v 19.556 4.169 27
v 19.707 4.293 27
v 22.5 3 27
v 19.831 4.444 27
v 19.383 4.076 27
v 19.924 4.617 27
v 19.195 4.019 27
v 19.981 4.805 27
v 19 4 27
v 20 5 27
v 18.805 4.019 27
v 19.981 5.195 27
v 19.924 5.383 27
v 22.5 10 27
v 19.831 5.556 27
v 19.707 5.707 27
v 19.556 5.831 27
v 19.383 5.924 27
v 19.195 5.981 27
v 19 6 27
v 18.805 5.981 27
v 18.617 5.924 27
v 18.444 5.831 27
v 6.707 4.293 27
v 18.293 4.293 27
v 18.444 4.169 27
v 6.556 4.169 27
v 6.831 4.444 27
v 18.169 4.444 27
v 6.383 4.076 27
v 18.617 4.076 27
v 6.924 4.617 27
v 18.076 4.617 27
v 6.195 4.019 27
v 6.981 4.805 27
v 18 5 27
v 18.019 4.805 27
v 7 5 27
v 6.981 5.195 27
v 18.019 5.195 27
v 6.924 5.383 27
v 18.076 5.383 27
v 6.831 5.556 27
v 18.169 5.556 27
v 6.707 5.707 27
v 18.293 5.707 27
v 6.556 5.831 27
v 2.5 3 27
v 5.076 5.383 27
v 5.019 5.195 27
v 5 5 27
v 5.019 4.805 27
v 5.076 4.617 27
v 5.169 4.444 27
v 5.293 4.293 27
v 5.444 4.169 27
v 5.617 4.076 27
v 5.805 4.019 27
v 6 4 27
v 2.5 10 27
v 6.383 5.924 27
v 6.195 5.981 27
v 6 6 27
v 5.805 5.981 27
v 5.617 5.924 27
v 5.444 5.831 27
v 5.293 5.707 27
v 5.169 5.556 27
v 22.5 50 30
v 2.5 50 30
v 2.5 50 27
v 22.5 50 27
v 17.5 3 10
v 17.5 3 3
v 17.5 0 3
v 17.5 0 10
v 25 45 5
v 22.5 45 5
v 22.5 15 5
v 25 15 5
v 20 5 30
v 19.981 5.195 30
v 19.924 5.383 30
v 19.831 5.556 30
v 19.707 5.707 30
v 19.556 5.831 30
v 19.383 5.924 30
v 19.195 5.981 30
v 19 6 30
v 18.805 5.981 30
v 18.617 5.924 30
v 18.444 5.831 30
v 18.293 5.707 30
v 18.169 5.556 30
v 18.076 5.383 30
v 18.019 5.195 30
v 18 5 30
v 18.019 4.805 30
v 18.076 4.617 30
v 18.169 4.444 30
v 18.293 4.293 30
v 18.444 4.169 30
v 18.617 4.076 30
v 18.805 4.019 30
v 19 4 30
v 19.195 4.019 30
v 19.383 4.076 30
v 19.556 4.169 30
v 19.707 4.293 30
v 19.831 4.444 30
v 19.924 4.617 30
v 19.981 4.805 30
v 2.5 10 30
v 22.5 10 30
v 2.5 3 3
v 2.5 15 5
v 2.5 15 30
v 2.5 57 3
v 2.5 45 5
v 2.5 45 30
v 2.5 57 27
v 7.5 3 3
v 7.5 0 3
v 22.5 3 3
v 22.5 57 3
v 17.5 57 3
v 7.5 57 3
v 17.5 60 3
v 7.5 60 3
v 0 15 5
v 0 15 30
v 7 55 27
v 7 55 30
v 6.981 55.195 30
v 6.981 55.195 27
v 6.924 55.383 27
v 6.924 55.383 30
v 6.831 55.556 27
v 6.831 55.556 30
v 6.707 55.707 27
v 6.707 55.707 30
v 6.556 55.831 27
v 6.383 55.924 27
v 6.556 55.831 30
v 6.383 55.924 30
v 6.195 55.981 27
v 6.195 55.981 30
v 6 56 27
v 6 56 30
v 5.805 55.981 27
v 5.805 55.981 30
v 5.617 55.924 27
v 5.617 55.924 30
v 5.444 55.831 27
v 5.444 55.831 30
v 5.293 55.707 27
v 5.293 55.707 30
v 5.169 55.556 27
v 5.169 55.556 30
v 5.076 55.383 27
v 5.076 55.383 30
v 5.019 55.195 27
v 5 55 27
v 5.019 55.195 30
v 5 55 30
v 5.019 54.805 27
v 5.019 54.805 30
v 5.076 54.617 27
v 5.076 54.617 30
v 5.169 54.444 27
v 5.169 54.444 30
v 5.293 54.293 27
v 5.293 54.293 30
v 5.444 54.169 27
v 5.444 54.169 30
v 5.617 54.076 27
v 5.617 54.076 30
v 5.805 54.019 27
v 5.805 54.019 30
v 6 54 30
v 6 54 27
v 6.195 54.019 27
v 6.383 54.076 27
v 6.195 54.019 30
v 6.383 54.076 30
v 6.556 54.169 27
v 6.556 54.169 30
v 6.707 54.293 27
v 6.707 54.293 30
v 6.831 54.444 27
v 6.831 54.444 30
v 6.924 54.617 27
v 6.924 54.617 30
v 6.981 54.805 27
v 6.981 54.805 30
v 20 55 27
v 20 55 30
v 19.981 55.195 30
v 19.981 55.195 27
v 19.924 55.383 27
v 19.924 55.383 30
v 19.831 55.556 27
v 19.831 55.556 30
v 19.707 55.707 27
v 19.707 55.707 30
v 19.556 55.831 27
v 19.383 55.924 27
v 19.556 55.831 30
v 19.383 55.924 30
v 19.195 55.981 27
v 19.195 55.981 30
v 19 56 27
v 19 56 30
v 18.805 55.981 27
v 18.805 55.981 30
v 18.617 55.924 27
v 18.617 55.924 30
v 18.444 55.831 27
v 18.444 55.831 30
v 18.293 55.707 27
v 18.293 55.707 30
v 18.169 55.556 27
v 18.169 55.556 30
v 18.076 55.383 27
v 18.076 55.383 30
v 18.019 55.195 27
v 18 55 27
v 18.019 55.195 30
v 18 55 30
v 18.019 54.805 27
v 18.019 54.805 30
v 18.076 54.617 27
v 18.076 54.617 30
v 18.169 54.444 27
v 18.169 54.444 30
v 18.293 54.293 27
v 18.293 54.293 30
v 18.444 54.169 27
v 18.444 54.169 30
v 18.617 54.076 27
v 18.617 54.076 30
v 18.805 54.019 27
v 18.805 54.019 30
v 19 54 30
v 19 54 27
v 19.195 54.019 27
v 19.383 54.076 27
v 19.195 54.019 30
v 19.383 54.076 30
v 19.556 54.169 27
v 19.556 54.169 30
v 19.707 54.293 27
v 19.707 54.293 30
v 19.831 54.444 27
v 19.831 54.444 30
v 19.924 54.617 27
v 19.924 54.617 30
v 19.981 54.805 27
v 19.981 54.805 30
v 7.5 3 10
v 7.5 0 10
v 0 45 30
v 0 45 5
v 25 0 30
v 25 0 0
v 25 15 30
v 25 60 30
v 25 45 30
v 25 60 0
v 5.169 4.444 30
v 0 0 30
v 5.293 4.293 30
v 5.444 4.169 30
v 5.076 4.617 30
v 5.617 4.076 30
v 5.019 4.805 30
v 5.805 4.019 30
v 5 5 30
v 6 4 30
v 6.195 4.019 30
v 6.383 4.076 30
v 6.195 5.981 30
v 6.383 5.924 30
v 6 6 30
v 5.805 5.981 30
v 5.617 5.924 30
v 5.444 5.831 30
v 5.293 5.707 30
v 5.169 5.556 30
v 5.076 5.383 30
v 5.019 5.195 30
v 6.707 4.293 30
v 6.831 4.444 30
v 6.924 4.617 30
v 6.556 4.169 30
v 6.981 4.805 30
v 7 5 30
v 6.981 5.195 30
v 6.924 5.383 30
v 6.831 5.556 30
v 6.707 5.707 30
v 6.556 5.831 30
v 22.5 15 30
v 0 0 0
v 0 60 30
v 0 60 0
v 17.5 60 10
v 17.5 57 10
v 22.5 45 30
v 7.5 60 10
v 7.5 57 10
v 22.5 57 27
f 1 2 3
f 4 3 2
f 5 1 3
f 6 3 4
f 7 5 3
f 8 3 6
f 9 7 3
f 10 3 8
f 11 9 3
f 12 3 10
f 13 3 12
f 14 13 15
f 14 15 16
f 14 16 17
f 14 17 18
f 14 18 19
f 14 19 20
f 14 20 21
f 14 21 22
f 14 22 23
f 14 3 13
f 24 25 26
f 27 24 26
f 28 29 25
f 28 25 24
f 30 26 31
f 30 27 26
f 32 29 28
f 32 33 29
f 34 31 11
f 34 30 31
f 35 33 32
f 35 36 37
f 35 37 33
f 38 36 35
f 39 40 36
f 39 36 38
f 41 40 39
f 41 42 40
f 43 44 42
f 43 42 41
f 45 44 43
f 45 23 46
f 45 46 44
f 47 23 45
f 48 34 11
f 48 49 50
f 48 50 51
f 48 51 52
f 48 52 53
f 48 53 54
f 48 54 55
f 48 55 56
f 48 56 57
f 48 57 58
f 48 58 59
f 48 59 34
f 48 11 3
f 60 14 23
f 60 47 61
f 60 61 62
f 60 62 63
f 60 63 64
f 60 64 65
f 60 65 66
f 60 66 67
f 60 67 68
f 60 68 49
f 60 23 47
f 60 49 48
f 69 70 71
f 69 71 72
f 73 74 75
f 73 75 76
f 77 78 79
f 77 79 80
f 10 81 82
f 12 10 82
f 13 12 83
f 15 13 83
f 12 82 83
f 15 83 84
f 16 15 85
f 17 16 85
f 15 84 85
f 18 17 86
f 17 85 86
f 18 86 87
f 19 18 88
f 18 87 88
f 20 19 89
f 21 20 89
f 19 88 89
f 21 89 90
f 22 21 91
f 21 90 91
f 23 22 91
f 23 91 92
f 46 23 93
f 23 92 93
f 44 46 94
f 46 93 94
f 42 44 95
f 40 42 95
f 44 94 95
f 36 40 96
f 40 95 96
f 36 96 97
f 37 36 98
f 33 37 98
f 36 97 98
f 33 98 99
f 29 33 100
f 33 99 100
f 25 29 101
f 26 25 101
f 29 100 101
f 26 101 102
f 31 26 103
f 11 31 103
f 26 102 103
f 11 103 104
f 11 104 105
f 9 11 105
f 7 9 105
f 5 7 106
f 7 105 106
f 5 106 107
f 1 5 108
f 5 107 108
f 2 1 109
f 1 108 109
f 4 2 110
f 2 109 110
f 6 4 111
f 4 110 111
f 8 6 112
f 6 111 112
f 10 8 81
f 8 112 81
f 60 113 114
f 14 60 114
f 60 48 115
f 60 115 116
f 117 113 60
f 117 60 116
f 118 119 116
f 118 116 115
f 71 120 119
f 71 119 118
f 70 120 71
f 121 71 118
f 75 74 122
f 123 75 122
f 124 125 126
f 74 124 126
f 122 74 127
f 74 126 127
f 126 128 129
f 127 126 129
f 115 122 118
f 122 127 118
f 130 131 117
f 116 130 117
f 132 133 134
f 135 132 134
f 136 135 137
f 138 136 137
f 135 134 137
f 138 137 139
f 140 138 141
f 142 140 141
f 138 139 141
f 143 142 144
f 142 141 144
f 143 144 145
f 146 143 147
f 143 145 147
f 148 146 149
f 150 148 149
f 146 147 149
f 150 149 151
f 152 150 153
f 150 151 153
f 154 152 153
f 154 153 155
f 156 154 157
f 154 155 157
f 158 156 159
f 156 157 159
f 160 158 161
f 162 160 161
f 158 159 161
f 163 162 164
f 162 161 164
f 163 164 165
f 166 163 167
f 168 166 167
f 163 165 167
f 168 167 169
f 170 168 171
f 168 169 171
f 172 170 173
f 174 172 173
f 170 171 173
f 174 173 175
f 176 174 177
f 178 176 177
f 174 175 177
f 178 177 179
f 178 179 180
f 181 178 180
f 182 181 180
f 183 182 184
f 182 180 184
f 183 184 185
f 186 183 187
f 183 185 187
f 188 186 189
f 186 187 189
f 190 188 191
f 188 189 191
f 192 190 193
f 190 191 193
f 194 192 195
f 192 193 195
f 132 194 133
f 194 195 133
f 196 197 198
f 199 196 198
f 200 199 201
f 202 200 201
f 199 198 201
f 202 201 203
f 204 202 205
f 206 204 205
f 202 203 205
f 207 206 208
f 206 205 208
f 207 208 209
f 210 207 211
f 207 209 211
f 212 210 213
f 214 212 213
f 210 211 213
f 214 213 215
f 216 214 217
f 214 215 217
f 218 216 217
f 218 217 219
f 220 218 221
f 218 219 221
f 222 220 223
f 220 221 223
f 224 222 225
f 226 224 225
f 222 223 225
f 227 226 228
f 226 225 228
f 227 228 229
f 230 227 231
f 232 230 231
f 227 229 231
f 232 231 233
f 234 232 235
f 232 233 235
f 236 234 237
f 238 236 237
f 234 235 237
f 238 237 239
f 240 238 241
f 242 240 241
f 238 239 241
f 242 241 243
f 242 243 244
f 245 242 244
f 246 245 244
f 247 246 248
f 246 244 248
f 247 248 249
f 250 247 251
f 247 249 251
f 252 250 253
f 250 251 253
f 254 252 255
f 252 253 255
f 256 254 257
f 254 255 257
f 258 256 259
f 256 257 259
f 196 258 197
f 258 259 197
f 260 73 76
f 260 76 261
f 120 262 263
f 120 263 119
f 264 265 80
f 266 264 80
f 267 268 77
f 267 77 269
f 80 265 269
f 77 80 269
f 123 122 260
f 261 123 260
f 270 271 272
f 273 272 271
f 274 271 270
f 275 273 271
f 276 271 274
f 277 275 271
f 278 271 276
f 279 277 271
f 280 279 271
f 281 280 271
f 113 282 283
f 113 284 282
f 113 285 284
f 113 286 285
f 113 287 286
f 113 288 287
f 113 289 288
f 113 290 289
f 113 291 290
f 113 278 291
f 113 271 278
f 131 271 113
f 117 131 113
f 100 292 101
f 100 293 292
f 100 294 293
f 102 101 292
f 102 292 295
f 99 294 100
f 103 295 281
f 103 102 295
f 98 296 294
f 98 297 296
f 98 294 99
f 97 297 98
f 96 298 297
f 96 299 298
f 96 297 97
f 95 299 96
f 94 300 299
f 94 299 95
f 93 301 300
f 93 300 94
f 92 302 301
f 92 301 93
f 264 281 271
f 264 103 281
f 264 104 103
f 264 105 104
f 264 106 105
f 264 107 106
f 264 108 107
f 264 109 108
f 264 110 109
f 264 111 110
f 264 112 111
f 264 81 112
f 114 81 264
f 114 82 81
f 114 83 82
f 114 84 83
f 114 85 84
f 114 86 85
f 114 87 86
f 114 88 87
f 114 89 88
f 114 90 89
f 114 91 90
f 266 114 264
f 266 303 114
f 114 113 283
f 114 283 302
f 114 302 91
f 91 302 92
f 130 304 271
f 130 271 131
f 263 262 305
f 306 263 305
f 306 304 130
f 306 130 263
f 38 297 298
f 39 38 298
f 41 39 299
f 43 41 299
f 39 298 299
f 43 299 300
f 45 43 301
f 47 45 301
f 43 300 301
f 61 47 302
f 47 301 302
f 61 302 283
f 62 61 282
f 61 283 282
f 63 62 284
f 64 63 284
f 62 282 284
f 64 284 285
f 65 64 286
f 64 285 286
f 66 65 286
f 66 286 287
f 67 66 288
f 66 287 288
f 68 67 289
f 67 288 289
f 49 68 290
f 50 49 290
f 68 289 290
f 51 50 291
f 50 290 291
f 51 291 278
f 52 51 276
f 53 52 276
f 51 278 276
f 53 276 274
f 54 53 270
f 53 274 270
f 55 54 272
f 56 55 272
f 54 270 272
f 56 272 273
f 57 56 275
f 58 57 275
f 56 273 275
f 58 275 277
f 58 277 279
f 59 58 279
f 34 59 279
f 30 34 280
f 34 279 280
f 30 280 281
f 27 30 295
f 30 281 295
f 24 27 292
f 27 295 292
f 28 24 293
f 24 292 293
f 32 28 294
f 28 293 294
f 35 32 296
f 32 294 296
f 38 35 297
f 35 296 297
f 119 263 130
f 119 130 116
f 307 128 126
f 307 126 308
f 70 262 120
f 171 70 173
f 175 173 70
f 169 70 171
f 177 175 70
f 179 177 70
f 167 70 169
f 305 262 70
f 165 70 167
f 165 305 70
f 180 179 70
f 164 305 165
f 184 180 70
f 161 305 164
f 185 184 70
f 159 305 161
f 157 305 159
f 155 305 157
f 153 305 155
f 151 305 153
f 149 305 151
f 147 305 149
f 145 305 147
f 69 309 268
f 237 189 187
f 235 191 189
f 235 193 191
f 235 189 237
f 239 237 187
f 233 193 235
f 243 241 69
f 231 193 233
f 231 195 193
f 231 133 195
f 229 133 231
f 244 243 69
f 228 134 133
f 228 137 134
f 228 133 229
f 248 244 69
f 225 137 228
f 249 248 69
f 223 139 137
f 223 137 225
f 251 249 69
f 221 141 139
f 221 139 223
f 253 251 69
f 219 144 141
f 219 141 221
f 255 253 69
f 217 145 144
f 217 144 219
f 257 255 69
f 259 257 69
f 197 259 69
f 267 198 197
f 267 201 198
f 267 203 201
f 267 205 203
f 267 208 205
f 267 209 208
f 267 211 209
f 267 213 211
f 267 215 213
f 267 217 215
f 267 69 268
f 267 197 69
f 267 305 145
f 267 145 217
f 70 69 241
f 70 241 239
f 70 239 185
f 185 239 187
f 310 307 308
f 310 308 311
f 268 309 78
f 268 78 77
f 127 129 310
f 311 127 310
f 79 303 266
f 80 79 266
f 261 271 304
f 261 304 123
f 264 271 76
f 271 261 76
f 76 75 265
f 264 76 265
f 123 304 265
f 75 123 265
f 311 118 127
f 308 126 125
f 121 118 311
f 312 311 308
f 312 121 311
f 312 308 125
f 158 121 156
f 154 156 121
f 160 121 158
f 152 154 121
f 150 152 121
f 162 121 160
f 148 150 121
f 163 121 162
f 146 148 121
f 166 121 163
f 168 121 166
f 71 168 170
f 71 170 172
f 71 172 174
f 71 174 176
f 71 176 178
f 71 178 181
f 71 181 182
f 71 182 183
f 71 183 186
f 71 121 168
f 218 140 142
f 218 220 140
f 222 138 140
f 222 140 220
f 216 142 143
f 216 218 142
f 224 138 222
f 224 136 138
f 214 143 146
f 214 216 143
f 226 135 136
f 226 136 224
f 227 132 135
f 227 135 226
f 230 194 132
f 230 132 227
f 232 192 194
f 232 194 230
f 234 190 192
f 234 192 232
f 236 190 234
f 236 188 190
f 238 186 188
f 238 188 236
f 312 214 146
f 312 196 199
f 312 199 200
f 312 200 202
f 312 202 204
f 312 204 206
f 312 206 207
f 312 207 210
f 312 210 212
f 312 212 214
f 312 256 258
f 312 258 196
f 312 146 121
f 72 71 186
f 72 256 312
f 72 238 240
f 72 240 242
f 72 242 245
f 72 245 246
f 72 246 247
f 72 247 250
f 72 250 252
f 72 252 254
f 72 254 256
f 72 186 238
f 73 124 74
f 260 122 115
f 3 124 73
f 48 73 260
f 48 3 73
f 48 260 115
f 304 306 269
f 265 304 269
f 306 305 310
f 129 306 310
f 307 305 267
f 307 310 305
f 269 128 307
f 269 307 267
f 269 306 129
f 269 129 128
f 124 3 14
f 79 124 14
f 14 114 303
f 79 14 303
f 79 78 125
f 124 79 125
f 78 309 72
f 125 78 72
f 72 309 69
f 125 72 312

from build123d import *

# Parameters (mm, degrees)
SKETCH_W        = 25
SKETCH_H        = 60
PAD_DEPTH       = 30
SKETCH001_W     = 20
SKETCH001_H     = 40
POCKET_DEPTH    = 27
SKETCH002_W     = 2.5
SKETCH002_H     = 30
POCKET001_DEPTH = 25
SKETCH003_W     = 2.5
SKETCH003_H     = 30
POCKET002_DEPTH = 25
SKETCH004_W     = 20
SKETCH004_H     = 24
POCKET003_DEPTH = 7
SKETCH005_W     = 20
SKETCH005_H     = 24
POCKET004_DEPTH = 7
SKETCH006_W     = 10
SKETCH006_H     = 7
POCKET005_DEPTH = 60.001
SKETCH007_R     = 1
POCKET006_DEPTH = 3
SKETCH008_R     = 1
POCKET007_DEPTH = 3


with BuildPart() as part:
    # Sketch → Pad (new body)
    with BuildSketch(Plane.XY):
        with Locations((12.5, 30)):
            Rectangle(SKETCH_W, SKETCH_H)
    extrude(amount=PAD_DEPTH)

    # Sketch001 (on Face6 of Pad) → Pocket (cut)
    with BuildSketch(Plane.XY.offset(30)):
        with Locations((12.5, 30)):
            Rectangle(SKETCH001_W, SKETCH001_H)
    extrude(amount=-POCKET_DEPTH, mode=Mode.SUBTRACT)

    # Sketch002 (on Face5 of Pocket) → Pocket001 (cut)
    with BuildSketch(Plane.XY.offset(30)):
        with Locations((1.25, 30)):
            Rectangle(SKETCH002_W, SKETCH002_H)
    extrude(amount=-POCKET001_DEPTH, mode=Mode.SUBTRACT)

    # Sketch003 (on Face5 of Pocket) → Pocket002 (cut)
    with BuildSketch(Plane.XY.offset(30)):
        with Locations((23.75, 30)):
            Rectangle(SKETCH003_W, SKETCH003_H)
    extrude(amount=-POCKET002_DEPTH, mode=Mode.SUBTRACT)

    # Sketch004 (on Face17 of Pocket002) → Pocket003 (cut)
    with BuildSketch(Plane.XZ.offset(-50)):
        with Locations((12.5, 15)):
            Rectangle(SKETCH004_W, SKETCH004_H)
    extrude(amount=-POCKET003_DEPTH, mode=Mode.SUBTRACT)

    # Sketch005 (on Face15 of Pocket002) → Pocket004 (cut)
    with BuildSketch(Plane(origin=(0, 10, 0), x_dir=(-1, 0, 0), z_dir=(0, 1, 0))):
        with Locations((-12.5, 15)):
            Rectangle(SKETCH005_W, SKETCH005_H)
    extrude(amount=-POCKET004_DEPTH, mode=Mode.SUBTRACT)

    # Sketch006 (on Face10 of Pocket004) → Pocket005 (cut, through all)
    with BuildSketch(Plane(origin=(0, 60, 0), x_dir=(-1, 0, 0), z_dir=(0, 1, 0))):
        with Locations((-12.5, 6.5)):
            Rectangle(SKETCH006_W, SKETCH006_H)
    extrude(amount=-POCKET005_DEPTH, mode=Mode.SUBTRACT)

    # Sketch007 (on Face4 of Pocket005) → Pocket006 (cut)
    with BuildSketch(Plane.XY.offset(30)):
        with Locations((6, 5)):
            Circle(SKETCH007_R)
        with Locations((19, 5)):
            Circle(SKETCH007_R)
    extrude(amount=-POCKET006_DEPTH, mode=Mode.SUBTRACT)

    # Sketch008 (on Face13 of Pocket005) → Pocket007 (cut)
    with BuildSketch(Plane.XY.offset(30)):
        with Locations((6, 55)):
            Circle(SKETCH008_R)
        with Locations((19, 55)):
            Circle(SKETCH008_R)
    extrude(amount=-POCKET007_DEPTH, mode=Mode.SUBTRACT)


solid = part.part
